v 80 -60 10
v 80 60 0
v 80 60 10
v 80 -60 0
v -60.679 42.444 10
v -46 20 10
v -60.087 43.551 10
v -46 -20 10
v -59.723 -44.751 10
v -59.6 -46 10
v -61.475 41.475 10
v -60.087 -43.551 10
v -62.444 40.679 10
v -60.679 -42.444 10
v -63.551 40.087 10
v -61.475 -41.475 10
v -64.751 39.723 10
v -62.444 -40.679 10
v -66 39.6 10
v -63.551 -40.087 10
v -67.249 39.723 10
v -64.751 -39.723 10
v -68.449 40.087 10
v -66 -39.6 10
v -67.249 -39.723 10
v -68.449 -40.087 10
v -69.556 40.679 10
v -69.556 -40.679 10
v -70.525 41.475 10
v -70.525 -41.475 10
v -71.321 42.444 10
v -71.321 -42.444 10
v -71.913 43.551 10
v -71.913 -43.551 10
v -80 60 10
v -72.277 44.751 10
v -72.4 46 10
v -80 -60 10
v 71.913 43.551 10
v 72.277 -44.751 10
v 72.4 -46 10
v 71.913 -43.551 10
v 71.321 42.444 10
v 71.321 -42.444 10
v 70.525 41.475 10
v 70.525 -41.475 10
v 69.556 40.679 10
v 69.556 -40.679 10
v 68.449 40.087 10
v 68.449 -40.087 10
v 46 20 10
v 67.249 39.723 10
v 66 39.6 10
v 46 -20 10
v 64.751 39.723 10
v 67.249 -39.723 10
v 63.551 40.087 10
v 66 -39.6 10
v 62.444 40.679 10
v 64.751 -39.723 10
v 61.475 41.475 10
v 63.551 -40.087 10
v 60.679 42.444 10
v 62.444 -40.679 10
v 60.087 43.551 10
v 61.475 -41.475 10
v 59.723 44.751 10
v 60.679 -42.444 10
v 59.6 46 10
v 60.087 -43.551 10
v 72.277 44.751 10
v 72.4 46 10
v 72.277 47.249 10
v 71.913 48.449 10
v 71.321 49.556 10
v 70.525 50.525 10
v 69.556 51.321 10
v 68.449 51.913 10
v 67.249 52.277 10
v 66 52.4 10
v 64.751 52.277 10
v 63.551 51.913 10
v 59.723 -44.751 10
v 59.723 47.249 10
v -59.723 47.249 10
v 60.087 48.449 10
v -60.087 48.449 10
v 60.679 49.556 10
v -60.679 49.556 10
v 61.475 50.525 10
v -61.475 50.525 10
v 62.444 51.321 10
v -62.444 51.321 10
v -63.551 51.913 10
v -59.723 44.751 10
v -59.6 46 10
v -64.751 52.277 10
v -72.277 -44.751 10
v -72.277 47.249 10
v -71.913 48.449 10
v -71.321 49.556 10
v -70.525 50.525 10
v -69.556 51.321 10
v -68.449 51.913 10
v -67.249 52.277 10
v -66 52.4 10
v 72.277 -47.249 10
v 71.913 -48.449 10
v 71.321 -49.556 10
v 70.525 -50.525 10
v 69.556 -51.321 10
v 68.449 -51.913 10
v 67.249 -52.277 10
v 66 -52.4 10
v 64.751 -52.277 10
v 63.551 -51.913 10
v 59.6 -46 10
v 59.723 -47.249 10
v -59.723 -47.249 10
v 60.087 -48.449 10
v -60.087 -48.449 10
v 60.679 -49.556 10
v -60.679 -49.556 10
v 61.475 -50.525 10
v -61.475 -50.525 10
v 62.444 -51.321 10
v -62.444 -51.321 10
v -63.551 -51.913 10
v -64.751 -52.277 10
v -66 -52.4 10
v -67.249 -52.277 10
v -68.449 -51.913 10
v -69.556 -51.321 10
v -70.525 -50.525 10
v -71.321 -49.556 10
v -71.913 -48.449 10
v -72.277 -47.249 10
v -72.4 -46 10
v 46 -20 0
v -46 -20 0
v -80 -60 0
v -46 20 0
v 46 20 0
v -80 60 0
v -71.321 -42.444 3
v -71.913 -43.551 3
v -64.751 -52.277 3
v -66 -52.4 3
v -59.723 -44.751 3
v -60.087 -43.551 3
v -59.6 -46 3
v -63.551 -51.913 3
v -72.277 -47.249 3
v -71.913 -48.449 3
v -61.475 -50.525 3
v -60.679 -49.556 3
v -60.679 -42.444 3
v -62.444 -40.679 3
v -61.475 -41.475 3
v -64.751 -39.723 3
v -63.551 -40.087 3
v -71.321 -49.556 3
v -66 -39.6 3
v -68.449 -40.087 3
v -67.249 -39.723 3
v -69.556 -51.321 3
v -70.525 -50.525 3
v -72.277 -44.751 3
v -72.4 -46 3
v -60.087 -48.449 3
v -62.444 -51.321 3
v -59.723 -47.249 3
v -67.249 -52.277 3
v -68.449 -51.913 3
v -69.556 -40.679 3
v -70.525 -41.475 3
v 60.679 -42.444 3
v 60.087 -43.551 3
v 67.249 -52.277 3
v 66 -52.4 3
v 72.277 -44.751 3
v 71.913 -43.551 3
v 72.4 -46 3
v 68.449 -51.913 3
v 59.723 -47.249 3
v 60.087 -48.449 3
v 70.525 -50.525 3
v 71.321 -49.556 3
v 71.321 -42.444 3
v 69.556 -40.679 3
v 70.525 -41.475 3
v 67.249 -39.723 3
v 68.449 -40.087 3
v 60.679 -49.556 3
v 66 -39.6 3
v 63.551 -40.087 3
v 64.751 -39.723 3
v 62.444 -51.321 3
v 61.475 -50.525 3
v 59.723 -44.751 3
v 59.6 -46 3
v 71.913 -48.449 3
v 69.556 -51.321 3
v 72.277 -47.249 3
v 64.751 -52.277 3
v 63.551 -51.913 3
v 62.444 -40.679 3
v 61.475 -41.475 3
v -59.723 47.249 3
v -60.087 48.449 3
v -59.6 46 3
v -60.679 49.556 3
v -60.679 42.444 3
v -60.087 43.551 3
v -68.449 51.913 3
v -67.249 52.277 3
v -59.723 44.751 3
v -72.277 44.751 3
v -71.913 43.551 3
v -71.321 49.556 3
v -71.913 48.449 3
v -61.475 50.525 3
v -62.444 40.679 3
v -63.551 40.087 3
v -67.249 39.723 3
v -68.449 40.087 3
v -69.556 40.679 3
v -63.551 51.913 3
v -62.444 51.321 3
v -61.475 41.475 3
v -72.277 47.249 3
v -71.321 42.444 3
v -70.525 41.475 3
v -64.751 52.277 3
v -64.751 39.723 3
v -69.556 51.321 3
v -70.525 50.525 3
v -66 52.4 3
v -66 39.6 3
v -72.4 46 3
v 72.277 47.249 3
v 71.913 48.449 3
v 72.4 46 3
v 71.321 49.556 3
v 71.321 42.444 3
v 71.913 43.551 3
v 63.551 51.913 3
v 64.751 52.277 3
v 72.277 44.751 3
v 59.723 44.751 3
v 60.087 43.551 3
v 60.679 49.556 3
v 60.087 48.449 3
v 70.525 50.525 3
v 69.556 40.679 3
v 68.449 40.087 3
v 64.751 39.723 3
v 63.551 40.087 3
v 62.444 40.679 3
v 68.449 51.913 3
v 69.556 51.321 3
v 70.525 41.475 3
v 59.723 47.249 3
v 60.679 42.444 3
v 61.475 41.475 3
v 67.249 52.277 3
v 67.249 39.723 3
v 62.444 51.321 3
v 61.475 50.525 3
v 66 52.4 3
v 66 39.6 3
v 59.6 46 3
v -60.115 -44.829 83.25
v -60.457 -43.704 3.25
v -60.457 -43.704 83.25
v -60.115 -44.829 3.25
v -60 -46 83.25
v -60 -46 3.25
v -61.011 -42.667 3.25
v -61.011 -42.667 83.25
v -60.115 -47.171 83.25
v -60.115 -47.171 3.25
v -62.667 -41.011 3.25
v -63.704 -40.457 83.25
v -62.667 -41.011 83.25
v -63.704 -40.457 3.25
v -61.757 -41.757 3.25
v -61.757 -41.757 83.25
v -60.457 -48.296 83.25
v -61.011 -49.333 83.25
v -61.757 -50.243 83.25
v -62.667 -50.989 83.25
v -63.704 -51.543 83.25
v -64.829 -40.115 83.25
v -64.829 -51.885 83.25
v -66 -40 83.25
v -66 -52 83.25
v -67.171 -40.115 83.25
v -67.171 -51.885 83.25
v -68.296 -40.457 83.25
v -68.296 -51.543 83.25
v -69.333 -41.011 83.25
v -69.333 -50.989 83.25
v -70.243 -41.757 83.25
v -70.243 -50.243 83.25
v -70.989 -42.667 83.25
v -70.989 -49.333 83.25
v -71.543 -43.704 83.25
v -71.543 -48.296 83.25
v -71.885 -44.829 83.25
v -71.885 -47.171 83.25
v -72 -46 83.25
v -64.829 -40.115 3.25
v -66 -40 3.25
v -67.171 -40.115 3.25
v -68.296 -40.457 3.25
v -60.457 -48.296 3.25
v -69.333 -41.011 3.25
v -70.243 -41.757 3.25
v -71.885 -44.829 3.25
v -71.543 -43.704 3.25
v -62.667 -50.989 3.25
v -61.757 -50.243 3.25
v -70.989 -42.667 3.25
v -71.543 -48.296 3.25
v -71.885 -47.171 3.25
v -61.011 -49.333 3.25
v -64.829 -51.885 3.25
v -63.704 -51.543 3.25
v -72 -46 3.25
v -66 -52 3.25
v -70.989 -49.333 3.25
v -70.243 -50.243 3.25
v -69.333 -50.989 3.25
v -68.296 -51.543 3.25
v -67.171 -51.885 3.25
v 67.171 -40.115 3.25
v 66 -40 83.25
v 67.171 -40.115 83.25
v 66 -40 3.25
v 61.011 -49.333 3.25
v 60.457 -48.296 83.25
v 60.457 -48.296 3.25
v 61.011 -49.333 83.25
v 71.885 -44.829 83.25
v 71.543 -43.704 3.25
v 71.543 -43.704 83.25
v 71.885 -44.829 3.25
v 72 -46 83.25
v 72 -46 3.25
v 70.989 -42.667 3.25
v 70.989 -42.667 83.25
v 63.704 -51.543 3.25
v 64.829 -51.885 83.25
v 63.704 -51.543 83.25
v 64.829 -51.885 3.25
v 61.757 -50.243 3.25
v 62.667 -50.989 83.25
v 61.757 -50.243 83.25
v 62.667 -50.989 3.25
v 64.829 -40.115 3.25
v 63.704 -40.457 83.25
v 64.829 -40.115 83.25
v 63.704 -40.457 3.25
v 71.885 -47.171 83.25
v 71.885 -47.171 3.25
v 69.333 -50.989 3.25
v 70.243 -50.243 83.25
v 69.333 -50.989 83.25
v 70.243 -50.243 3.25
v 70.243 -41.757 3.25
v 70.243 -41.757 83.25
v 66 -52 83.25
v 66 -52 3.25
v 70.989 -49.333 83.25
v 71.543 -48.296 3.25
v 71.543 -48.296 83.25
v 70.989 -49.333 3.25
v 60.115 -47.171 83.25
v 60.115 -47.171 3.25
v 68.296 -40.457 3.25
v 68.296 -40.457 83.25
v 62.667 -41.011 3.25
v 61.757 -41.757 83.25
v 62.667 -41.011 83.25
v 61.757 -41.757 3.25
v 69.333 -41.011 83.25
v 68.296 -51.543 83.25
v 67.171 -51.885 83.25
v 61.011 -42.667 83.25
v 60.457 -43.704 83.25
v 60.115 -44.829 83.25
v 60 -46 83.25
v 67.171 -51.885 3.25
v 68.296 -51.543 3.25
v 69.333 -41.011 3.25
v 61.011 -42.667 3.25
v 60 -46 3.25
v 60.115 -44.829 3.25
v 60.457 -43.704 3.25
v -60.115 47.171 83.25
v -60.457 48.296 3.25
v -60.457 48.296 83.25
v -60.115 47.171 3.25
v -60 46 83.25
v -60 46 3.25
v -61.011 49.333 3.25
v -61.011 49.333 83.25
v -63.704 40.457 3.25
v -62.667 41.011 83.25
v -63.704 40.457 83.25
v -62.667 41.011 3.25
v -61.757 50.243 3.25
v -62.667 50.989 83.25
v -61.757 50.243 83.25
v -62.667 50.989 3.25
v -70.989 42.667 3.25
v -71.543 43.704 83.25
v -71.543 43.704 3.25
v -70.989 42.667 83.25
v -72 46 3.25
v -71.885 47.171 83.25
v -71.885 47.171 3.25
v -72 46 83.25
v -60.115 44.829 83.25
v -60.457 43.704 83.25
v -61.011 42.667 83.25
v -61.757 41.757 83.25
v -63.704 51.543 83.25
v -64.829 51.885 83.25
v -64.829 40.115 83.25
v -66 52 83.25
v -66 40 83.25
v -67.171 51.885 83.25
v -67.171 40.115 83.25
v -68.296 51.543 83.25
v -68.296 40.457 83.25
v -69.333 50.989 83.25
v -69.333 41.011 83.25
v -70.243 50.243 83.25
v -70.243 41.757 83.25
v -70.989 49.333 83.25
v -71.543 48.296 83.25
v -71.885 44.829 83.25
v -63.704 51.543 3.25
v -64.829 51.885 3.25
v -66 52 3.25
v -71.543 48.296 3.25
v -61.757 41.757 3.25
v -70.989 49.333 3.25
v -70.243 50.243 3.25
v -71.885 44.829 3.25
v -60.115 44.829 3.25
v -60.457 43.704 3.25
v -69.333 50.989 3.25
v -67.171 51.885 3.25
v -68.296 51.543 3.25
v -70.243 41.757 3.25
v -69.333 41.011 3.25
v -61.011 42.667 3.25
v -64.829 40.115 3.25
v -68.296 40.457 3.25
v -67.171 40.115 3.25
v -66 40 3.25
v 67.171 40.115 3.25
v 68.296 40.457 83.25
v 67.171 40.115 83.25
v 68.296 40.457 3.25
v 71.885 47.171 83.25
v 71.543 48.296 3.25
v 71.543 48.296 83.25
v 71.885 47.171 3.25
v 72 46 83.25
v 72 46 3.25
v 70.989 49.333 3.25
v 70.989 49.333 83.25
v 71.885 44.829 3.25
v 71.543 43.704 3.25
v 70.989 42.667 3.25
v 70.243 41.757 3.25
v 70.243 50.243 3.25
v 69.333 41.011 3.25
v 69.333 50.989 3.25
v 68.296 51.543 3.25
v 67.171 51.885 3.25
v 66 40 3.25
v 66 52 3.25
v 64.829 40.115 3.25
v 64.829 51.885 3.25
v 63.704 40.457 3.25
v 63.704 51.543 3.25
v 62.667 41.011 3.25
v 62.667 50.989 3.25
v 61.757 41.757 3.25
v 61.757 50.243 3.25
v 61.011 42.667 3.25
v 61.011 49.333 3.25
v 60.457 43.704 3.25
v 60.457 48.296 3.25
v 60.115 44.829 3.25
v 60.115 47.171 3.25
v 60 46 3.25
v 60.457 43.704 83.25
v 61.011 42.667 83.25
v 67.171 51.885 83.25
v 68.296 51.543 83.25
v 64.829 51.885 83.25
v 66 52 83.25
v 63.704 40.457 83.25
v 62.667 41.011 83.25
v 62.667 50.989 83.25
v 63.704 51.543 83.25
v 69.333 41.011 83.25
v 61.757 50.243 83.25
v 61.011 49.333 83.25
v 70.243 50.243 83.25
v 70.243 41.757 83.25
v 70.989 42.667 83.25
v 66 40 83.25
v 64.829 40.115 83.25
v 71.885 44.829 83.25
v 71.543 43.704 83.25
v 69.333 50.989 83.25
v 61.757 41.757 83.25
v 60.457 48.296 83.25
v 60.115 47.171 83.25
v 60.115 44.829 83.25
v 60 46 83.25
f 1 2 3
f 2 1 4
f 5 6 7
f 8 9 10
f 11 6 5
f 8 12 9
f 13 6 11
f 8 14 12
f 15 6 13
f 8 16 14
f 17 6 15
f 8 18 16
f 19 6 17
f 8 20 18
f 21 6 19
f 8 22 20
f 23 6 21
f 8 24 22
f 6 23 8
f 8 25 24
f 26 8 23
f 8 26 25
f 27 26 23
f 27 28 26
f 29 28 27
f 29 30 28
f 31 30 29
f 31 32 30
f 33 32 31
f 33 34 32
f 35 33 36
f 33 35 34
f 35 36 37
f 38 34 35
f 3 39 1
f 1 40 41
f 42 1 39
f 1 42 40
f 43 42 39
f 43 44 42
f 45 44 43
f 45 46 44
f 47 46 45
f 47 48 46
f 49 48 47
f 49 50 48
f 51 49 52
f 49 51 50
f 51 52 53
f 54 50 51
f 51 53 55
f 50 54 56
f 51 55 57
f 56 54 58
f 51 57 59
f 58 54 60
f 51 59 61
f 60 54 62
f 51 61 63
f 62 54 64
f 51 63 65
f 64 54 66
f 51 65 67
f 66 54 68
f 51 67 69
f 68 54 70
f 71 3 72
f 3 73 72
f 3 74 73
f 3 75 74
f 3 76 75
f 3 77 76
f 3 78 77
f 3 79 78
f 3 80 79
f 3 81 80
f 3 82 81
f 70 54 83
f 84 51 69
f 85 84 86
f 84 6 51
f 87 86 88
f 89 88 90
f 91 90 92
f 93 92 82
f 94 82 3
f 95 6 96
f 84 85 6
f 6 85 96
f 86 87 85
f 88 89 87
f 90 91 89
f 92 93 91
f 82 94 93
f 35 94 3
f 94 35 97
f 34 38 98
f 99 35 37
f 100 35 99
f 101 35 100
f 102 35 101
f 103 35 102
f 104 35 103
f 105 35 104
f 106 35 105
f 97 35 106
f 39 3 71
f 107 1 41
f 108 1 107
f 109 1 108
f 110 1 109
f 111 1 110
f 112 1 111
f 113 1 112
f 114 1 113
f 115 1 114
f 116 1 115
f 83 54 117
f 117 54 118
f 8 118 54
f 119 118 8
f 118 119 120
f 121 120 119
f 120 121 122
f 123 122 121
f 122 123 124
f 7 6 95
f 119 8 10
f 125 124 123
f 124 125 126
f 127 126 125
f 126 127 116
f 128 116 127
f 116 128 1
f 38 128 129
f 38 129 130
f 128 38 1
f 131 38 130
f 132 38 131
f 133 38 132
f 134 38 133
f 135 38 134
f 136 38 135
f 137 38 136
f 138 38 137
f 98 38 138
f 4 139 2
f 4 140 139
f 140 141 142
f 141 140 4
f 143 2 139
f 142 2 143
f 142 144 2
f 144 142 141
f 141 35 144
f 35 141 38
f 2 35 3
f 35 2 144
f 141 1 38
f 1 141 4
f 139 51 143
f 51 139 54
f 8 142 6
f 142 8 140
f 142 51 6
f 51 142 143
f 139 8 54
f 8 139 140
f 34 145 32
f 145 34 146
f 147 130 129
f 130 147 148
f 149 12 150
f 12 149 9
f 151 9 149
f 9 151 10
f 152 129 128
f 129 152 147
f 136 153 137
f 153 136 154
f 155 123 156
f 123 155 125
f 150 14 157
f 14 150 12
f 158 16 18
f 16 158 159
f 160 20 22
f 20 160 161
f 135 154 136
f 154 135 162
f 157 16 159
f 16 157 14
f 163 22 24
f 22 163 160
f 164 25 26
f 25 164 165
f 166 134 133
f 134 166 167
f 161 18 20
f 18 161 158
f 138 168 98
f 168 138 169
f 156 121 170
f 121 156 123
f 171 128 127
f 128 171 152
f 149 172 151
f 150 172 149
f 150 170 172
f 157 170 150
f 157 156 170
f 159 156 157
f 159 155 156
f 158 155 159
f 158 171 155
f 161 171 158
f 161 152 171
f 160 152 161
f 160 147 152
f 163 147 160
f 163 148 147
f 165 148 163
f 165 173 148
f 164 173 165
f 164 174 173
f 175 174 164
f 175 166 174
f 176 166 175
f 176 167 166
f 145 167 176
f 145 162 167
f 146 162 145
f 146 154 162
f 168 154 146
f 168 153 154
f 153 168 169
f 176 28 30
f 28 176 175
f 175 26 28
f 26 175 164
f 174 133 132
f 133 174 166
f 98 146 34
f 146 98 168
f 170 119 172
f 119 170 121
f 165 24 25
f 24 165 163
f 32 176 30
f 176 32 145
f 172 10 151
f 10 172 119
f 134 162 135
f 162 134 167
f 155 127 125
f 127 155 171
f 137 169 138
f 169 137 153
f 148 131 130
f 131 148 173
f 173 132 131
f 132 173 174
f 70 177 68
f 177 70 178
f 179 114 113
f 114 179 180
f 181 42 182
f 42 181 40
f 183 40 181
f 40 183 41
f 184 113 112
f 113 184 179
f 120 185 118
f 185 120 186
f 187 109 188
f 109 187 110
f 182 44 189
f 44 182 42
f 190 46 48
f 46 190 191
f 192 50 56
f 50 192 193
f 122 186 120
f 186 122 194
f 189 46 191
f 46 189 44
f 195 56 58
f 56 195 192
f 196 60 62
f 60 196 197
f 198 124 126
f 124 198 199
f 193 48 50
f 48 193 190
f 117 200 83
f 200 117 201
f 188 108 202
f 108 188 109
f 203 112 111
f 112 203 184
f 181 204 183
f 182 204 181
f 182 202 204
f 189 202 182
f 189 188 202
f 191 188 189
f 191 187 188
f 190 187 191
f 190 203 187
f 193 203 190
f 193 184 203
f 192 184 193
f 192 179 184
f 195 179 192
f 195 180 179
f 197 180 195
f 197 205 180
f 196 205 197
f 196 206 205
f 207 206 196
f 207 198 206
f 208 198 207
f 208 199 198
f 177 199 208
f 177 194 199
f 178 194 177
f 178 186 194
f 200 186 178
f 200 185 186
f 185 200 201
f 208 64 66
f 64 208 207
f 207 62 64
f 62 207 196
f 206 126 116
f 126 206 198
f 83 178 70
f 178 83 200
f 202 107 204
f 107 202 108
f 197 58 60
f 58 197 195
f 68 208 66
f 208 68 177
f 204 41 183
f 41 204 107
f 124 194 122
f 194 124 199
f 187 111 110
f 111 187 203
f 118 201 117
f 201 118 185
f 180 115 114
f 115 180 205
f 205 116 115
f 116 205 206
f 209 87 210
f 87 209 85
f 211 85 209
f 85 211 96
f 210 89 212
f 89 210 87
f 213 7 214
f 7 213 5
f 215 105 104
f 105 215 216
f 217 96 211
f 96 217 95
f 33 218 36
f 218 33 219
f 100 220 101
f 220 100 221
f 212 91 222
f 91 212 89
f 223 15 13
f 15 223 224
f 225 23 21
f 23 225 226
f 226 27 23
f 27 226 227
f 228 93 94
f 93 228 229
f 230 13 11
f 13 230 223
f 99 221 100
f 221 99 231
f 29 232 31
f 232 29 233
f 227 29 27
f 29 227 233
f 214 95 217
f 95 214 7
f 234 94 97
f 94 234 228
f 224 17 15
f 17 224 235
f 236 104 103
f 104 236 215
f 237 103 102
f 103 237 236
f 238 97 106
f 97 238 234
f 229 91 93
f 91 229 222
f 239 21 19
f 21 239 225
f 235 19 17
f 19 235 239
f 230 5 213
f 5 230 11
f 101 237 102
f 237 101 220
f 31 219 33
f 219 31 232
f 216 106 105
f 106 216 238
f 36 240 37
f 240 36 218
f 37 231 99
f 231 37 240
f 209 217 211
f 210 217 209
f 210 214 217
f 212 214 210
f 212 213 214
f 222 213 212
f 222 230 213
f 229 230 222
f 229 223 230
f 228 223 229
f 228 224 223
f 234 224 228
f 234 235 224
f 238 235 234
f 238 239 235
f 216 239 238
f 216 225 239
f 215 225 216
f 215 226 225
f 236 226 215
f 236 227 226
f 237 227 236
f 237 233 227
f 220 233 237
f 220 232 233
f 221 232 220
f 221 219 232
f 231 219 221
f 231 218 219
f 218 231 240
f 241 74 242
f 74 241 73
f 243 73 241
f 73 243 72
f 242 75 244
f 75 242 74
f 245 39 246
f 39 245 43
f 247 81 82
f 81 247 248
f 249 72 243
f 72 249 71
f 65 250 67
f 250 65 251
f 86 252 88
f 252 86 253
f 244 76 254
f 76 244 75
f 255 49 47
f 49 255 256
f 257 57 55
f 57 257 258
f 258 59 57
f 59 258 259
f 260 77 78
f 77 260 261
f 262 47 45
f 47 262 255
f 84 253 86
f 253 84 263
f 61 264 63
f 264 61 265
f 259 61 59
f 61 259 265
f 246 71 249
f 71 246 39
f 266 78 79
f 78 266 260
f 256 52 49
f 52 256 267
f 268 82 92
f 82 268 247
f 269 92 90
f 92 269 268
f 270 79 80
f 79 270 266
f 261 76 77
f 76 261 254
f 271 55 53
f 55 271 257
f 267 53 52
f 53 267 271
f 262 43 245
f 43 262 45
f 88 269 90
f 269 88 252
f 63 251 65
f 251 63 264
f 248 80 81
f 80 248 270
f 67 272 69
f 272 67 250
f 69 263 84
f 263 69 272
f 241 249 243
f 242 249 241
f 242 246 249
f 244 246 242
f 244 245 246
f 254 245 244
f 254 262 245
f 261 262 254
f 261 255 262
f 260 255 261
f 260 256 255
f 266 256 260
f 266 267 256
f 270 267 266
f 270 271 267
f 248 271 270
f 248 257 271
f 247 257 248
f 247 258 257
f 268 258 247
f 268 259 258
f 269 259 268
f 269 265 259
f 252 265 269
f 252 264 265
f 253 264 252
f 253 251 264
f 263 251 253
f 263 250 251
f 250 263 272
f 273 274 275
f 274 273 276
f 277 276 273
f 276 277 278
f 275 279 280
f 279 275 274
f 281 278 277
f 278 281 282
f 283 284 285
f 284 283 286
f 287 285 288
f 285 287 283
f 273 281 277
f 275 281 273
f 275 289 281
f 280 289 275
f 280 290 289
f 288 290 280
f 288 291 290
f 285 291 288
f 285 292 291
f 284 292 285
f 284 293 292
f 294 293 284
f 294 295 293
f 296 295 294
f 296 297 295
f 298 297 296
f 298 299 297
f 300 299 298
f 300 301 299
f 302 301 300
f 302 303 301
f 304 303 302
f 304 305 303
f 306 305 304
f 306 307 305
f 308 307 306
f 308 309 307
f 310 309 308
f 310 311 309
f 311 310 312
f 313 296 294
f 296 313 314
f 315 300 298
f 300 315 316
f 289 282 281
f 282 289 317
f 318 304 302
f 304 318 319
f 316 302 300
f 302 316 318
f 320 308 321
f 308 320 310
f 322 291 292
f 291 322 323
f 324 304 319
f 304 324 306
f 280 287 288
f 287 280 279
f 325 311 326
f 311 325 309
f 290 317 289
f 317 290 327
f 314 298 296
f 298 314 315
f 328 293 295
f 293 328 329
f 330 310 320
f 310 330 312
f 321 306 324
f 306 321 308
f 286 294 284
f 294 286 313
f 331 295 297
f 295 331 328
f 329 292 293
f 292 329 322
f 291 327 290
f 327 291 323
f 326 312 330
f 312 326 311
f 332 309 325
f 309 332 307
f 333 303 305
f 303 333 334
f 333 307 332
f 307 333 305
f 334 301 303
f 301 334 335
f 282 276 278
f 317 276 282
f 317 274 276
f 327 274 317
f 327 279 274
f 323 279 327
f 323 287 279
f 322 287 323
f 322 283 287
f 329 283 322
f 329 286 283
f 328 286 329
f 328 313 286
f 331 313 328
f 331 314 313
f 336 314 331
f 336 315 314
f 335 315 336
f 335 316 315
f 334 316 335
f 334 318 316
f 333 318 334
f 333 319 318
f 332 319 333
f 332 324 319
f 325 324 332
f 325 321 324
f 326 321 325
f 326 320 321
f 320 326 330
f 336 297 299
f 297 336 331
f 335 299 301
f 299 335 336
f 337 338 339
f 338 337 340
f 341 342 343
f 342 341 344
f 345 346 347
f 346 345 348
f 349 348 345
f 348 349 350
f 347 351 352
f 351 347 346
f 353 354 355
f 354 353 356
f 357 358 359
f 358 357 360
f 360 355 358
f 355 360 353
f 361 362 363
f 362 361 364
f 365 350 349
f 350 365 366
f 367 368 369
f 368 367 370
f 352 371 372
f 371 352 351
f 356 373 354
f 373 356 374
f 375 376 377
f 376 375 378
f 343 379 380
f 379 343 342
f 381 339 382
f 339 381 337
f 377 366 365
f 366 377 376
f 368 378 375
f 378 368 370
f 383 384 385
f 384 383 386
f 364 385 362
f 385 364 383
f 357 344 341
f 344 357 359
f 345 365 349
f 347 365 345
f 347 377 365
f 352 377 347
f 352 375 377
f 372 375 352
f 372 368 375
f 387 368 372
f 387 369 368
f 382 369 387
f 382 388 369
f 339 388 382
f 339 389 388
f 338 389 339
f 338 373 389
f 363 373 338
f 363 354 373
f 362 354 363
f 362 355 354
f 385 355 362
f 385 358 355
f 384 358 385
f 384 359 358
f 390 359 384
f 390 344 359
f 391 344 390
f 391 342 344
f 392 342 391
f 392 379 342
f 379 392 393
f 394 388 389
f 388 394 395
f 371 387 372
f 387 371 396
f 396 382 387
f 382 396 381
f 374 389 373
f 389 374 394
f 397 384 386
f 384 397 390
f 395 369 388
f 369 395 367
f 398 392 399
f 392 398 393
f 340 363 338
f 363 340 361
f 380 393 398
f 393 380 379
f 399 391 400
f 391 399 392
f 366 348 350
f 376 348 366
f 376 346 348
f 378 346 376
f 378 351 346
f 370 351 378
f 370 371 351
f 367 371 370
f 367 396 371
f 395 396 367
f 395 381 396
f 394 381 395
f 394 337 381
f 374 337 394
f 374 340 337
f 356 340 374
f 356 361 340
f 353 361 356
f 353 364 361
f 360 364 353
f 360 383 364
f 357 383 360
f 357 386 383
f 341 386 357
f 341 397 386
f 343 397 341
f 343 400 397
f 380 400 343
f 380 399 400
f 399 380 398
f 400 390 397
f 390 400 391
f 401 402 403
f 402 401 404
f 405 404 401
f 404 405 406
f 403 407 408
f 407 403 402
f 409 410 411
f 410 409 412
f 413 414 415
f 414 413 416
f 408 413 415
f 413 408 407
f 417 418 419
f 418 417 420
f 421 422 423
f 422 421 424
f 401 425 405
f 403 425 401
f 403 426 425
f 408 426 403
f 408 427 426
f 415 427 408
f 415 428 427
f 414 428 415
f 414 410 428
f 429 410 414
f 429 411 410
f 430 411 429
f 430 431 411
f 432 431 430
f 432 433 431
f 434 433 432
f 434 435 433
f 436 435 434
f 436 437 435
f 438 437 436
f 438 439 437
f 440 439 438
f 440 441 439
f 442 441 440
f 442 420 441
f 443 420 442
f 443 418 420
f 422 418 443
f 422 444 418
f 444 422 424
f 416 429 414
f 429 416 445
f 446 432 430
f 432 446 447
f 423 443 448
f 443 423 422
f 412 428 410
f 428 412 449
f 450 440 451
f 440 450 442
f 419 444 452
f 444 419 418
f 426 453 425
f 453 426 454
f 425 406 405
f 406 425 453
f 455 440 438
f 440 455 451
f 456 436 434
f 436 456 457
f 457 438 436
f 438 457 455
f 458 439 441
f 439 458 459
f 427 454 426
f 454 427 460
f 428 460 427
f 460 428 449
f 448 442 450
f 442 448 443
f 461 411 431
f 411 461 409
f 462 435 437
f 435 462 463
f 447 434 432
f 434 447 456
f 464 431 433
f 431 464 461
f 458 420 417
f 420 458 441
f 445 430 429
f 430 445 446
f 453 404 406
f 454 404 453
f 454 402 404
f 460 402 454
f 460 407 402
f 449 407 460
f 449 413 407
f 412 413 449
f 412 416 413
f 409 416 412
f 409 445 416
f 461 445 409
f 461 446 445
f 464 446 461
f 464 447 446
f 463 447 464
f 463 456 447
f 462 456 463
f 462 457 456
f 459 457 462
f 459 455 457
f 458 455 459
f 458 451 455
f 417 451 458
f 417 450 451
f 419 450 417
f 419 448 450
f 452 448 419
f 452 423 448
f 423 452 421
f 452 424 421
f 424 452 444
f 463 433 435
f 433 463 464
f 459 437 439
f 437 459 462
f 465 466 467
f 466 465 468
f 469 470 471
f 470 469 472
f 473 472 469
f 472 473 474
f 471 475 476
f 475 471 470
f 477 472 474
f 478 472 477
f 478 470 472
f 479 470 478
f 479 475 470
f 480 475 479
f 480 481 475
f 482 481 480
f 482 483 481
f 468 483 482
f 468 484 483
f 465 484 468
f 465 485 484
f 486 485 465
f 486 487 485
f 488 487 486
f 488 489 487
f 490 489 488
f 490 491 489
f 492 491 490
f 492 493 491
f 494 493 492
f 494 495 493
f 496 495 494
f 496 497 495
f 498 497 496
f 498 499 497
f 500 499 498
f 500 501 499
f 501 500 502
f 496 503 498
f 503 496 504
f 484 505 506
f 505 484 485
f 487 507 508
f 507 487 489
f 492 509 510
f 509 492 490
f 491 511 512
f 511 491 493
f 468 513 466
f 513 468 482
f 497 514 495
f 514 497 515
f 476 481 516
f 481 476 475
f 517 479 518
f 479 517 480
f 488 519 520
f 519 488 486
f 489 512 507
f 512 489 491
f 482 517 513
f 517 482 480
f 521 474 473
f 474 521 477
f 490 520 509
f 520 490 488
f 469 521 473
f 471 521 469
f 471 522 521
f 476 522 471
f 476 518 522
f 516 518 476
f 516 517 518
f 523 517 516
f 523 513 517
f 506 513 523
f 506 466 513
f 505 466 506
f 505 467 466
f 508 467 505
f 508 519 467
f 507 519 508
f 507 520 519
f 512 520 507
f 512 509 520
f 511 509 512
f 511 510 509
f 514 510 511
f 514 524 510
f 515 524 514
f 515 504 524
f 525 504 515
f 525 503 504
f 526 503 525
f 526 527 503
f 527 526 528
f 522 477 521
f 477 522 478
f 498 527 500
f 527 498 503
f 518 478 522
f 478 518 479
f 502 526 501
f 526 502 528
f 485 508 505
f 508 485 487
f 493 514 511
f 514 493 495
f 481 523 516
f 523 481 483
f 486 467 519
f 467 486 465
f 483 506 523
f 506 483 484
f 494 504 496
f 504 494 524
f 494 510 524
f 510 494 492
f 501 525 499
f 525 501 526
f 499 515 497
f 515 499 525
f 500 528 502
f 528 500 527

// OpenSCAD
$fn = 32;

// ------------------------------------------------------------------------
// Frame with four posts: 160 x 120 mm frame, four d12 posts
// Every part is its own module, assembly() places them once.
// ------------------------------------------------------------------------

// --- part 1 ---
module base_frame() {
  difference() {
    translate([-80, -60, 0]) cube([160, 120, 10]);
    translate([-46, -20, -1]) cube([92, 40, 12]);
    translate([-66, -46, 3]) cylinder(h = 8, d = 12.8);
    translate([66, -46, 3]) cylinder(h = 8, d = 12.8);
    translate([-66, 46, 3]) cylinder(h = 8, d = 12.8);
    translate([66, 46, 3]) cylinder(h = 8, d = 12.8);
  }
}

// --- part 2 ---
module post1() {
  cylinder(h = 80, d = 12);
}

// --- part 3 ---
module post2() {
  cylinder(h = 80, d = 12);
}

// --- part 4 ---
module post3() {
  cylinder(h = 80, d = 12);
}

// --- part 5 ---
module post4() {
  cylinder(h = 80, d = 12);
}

// --- assembly ---
module assembly() {
  translate([0, 0, 0]) rotate([0, 0, 0]) base_frame();
  translate([-66, -46, 3.25]) rotate([0, 0, 0]) post1();
  translate([66, -46, 3.25]) rotate([0, 0, 0]) post2();
  translate([-66, 46, 3.25]) rotate([0, 0, 0]) post3();
  translate([66, 46, 3.25]) rotate([0, 0, 0]) post4();
}

assembly();
